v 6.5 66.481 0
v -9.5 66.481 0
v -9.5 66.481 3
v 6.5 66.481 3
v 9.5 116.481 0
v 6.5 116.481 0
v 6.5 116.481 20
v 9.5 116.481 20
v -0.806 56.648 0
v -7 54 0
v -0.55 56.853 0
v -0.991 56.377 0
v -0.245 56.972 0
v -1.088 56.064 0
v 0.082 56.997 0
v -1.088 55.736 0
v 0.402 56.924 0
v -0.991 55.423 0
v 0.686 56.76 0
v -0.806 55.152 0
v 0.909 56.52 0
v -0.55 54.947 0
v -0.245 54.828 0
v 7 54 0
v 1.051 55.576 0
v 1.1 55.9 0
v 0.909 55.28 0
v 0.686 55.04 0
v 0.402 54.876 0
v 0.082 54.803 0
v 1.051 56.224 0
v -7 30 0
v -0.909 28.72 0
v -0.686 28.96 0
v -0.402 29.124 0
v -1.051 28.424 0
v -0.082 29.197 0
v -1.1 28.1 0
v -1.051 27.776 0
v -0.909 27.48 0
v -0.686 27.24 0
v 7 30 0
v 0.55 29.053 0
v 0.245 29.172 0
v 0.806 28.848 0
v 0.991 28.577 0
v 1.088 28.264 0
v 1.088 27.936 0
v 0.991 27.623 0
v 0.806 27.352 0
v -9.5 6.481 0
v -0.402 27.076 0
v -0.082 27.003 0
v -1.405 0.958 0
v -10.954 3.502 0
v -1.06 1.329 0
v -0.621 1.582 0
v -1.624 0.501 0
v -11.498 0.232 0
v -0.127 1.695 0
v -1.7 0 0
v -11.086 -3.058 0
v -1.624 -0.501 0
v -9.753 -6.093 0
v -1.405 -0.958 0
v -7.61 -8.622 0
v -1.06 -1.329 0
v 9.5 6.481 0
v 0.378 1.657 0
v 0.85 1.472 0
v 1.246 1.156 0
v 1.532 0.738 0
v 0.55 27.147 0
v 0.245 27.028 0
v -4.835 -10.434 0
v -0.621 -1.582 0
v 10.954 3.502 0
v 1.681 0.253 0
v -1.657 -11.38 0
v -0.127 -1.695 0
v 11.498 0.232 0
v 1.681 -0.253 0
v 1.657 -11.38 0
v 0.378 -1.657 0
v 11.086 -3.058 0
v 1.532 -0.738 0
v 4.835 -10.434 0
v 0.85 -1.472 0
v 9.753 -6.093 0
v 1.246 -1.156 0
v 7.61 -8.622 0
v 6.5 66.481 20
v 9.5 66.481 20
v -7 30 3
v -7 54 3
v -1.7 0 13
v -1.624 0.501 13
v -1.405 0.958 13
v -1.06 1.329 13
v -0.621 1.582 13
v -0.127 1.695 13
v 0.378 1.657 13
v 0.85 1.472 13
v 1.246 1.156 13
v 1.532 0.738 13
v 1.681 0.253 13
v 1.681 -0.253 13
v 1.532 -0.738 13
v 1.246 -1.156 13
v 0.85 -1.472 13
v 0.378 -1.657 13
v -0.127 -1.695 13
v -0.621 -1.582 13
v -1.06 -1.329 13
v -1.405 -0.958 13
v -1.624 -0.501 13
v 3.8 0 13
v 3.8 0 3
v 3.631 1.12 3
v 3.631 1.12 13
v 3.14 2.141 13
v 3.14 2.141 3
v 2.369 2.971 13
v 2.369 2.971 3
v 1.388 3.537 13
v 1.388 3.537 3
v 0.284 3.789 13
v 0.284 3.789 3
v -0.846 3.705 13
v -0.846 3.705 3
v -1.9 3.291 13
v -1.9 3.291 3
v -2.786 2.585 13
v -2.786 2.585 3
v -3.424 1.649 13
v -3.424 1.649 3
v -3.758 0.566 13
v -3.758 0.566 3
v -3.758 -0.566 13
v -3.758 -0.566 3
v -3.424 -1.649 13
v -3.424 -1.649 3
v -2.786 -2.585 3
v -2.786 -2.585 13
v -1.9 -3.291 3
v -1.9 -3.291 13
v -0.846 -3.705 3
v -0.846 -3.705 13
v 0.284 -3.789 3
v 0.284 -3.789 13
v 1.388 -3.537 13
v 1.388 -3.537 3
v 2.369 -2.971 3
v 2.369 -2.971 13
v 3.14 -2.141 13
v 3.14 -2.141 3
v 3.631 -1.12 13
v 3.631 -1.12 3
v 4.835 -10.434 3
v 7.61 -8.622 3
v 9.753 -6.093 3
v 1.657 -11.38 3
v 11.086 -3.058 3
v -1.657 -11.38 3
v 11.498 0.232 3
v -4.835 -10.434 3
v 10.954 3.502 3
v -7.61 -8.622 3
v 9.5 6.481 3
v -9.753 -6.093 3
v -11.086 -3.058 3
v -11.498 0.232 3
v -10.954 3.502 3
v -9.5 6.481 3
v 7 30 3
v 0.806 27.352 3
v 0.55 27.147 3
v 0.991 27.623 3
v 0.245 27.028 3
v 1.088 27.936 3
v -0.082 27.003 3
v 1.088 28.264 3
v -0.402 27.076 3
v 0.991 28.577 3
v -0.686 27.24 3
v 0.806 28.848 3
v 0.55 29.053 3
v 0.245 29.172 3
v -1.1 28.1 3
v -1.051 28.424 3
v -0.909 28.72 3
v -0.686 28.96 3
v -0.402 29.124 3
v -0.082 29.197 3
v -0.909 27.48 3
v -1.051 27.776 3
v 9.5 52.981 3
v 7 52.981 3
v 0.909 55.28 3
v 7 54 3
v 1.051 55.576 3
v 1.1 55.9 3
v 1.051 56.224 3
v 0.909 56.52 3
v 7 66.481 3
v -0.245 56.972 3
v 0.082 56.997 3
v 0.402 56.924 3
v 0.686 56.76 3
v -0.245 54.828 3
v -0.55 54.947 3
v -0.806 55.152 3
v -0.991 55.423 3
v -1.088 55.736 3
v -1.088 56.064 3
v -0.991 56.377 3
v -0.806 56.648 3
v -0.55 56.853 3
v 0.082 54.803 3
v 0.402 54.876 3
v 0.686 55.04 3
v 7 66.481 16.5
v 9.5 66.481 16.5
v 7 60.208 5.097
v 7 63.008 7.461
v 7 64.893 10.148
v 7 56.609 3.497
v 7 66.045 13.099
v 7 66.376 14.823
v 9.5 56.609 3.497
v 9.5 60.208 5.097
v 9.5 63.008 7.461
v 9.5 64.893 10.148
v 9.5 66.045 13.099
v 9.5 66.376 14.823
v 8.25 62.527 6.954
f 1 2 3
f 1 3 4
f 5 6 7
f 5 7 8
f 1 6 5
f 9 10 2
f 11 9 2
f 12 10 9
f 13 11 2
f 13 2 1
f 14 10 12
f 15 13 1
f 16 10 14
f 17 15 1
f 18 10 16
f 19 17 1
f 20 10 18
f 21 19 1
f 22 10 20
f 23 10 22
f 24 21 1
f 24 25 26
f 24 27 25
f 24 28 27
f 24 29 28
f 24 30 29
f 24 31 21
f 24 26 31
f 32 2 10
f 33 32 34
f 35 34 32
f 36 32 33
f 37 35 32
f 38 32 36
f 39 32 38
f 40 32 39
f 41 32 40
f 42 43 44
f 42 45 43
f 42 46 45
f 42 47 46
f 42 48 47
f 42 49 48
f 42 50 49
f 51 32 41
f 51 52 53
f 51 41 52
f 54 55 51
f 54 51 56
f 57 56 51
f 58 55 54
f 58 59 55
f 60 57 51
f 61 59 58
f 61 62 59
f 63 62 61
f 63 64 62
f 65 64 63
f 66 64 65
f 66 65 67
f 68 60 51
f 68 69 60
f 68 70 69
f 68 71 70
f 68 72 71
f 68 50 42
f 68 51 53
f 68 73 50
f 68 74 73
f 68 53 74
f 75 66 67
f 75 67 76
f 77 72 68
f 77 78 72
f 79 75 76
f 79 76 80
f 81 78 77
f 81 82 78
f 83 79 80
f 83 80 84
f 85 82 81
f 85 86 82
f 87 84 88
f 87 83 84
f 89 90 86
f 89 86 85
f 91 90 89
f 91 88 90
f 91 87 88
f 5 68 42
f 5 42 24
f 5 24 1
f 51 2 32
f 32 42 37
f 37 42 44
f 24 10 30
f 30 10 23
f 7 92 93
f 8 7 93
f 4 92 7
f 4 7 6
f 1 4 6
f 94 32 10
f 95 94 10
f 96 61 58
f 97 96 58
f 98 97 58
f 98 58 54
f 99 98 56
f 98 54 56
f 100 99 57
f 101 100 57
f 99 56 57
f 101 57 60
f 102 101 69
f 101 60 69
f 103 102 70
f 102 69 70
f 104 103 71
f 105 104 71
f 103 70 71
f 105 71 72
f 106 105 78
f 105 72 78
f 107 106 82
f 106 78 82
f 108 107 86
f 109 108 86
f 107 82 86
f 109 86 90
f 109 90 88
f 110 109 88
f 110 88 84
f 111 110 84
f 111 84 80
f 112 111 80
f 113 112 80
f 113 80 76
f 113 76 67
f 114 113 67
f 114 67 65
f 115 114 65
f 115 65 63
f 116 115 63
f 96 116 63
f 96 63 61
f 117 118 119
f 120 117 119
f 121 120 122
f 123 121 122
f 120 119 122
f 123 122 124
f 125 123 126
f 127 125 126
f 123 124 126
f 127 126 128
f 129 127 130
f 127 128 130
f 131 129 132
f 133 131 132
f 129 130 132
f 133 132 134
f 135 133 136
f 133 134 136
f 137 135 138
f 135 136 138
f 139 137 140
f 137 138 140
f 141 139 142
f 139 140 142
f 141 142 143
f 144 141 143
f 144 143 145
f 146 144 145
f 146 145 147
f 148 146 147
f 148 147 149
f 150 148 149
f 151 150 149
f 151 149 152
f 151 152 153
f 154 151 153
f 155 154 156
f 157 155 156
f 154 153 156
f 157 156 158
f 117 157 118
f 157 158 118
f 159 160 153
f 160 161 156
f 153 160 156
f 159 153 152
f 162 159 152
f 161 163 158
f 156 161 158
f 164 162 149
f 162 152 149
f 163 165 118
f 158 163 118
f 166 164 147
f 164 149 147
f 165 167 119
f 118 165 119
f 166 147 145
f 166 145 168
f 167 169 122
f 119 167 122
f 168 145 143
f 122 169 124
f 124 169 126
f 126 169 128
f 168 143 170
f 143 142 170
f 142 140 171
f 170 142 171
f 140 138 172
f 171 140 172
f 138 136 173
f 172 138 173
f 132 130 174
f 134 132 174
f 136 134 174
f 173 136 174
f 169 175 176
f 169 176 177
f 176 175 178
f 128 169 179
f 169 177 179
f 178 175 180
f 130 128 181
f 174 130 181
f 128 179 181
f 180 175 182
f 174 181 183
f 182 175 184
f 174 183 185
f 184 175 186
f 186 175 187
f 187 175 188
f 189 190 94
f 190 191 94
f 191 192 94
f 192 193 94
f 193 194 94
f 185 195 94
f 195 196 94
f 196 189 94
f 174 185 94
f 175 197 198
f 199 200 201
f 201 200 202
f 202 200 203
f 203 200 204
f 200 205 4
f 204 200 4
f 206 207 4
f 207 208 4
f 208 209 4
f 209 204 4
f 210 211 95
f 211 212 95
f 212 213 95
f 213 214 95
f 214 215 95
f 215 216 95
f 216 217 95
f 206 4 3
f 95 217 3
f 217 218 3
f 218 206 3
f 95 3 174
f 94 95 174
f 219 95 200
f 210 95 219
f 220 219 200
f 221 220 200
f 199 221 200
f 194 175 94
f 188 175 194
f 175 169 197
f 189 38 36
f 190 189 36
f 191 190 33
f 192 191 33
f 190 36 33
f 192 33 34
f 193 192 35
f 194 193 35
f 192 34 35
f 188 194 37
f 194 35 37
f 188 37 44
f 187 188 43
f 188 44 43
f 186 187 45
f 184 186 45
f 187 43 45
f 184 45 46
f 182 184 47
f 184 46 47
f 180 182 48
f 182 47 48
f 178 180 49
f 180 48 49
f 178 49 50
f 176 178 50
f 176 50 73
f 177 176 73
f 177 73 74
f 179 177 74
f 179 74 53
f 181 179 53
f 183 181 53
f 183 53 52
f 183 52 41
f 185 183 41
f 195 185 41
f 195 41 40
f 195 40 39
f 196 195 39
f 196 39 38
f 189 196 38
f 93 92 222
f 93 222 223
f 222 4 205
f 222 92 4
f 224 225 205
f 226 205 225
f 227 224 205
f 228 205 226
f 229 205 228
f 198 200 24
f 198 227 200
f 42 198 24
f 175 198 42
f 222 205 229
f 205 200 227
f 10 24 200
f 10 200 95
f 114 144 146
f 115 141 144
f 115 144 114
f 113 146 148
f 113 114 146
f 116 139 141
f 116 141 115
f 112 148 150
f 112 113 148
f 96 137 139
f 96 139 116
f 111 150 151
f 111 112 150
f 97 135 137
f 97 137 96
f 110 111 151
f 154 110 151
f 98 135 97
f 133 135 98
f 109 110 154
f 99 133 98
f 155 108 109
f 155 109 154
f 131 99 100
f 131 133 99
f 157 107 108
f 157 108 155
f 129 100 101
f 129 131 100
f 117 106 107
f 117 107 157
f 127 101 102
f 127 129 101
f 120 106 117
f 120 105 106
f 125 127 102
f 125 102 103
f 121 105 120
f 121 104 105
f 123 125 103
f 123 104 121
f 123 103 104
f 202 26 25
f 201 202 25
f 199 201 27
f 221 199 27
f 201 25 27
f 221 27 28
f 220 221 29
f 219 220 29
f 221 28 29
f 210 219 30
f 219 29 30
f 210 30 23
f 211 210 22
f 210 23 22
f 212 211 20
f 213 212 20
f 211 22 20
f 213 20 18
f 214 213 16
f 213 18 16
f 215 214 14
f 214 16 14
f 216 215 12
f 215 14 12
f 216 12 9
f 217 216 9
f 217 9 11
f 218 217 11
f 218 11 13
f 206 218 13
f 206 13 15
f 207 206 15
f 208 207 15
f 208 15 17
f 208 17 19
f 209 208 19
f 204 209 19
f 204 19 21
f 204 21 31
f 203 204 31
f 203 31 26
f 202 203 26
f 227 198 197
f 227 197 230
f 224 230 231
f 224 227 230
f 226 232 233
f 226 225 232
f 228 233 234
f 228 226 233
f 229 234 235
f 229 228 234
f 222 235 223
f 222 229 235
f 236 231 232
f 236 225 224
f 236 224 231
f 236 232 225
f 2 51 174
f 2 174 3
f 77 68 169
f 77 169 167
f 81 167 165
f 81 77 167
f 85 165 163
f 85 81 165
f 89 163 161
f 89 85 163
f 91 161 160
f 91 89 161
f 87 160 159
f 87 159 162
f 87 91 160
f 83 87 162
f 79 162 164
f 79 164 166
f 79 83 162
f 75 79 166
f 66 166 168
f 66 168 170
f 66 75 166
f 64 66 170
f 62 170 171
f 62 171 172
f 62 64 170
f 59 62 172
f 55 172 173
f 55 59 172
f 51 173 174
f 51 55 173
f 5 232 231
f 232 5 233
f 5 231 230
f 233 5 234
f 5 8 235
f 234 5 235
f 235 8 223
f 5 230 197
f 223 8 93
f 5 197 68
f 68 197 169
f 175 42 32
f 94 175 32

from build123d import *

# Parameters (mm, degrees)
BOSS_EXTRUDE1_DEPTH = 3
SKETCH2_R           = 3.8
BOSS_EXTRUDE2_DEPTH = 10
SKETCH3_R           = 1.7
CUT_EXTRUDE1_DEPTH  = 20
SKETCH5_R           = 1.1
SKETCH5_W           = 14
SKETCH5_H           = 24
CUT_EXTRUDE2_DEPTH  = 20
SKETCH6_W           = 3
SKETCH6_H           = 20
BOSS_EXTRUDE3_DEPTH = 50
FILLET2_START       = 7
FILLET2_DEPTH       = 2.5


with BuildPart() as part:
    # Sketch1 → Boss-Extrude1 (new body)
    with BuildSketch(Plane.XY):
        with BuildLine():
            Line((-9.5, 6.480740698), (-9.5, 66.480740698))
            Line((-9.5, 66.480740698), (9.5, 66.480740698))
            Line((9.5, 66.480740698), (9.5, 6.480740698))
            ThreePointArc((9.5, 6.480740698), (0, -11.5), (-9.5, 6.480740698))
        make_face()
    extrude(amount=BOSS_EXTRUDE1_DEPTH)

    # Sketch2 → Boss-Extrude2 (add)
    with BuildSketch(Plane.XY.offset(3)):
        Circle(SKETCH2_R)
    extrude(amount=BOSS_EXTRUDE2_DEPTH)

    # Sketch3 → Cut-Extrude1 (cut)
    with BuildSketch(Plane(origin=(0, 0, 0), x_dir=(-1, 0, 0), z_dir=(0, 0, -1))):
        Circle(SKETCH3_R)
    extrude(amount=-CUT_EXTRUDE1_DEPTH, mode=Mode.SUBTRACT)

    # Sketch5 → Cut-Extrude2 (cut)
    with BuildSketch(Plane(origin=(0, 0, 0), x_dir=(-1, 0, 0), z_dir=(0, 0, -1))):
        with Locations((0, 28.1)):
            Circle(SKETCH5_R)
        with Locations(Location((0, 55.9, 0), (0, 0, 180))):
            Circle(SKETCH5_R)
        with Locations((0, 42)):
            Rectangle(SKETCH5_W, SKETCH5_H)
    extrude(amount=-CUT_EXTRUDE2_DEPTH, mode=Mode.SUBTRACT)

    # Sketch6 → Boss-Extrude3 (add)
    with BuildSketch(Plane(origin=(0, 66.480740698, 0), x_dir=(1, 0, 0), z_dir=(0, 1, 0))):
        with Locations((8, -10)):
            Rectangle(SKETCH6_W, SKETCH6_H)
    extrude(amount=BOSS_EXTRUDE3_DEPTH)

    # Fillet2: read off the stored shape, not the designer's step
    # Fillet2 outline → Fillet2 (add)
    with BuildSketch(Plane.YZ.offset(FILLET2_START)):
        with BuildLine():
            add(Edge.make_bspline(
                [(52.980740698, 3), (66.480740698, 3), (66.480740698, 16.5)],
                knots=[0, 0, 0, 1, 1, 1], degree=2, weights=[1, 0.707106781, 1]))
            Line((52.980740698, 3), (66.480740698, 3))
            Line((66.480740698, 3), (66.480740698, 16.5))
        make_face()
    extrude(amount=FILLET2_DEPTH)


solid = part.part
